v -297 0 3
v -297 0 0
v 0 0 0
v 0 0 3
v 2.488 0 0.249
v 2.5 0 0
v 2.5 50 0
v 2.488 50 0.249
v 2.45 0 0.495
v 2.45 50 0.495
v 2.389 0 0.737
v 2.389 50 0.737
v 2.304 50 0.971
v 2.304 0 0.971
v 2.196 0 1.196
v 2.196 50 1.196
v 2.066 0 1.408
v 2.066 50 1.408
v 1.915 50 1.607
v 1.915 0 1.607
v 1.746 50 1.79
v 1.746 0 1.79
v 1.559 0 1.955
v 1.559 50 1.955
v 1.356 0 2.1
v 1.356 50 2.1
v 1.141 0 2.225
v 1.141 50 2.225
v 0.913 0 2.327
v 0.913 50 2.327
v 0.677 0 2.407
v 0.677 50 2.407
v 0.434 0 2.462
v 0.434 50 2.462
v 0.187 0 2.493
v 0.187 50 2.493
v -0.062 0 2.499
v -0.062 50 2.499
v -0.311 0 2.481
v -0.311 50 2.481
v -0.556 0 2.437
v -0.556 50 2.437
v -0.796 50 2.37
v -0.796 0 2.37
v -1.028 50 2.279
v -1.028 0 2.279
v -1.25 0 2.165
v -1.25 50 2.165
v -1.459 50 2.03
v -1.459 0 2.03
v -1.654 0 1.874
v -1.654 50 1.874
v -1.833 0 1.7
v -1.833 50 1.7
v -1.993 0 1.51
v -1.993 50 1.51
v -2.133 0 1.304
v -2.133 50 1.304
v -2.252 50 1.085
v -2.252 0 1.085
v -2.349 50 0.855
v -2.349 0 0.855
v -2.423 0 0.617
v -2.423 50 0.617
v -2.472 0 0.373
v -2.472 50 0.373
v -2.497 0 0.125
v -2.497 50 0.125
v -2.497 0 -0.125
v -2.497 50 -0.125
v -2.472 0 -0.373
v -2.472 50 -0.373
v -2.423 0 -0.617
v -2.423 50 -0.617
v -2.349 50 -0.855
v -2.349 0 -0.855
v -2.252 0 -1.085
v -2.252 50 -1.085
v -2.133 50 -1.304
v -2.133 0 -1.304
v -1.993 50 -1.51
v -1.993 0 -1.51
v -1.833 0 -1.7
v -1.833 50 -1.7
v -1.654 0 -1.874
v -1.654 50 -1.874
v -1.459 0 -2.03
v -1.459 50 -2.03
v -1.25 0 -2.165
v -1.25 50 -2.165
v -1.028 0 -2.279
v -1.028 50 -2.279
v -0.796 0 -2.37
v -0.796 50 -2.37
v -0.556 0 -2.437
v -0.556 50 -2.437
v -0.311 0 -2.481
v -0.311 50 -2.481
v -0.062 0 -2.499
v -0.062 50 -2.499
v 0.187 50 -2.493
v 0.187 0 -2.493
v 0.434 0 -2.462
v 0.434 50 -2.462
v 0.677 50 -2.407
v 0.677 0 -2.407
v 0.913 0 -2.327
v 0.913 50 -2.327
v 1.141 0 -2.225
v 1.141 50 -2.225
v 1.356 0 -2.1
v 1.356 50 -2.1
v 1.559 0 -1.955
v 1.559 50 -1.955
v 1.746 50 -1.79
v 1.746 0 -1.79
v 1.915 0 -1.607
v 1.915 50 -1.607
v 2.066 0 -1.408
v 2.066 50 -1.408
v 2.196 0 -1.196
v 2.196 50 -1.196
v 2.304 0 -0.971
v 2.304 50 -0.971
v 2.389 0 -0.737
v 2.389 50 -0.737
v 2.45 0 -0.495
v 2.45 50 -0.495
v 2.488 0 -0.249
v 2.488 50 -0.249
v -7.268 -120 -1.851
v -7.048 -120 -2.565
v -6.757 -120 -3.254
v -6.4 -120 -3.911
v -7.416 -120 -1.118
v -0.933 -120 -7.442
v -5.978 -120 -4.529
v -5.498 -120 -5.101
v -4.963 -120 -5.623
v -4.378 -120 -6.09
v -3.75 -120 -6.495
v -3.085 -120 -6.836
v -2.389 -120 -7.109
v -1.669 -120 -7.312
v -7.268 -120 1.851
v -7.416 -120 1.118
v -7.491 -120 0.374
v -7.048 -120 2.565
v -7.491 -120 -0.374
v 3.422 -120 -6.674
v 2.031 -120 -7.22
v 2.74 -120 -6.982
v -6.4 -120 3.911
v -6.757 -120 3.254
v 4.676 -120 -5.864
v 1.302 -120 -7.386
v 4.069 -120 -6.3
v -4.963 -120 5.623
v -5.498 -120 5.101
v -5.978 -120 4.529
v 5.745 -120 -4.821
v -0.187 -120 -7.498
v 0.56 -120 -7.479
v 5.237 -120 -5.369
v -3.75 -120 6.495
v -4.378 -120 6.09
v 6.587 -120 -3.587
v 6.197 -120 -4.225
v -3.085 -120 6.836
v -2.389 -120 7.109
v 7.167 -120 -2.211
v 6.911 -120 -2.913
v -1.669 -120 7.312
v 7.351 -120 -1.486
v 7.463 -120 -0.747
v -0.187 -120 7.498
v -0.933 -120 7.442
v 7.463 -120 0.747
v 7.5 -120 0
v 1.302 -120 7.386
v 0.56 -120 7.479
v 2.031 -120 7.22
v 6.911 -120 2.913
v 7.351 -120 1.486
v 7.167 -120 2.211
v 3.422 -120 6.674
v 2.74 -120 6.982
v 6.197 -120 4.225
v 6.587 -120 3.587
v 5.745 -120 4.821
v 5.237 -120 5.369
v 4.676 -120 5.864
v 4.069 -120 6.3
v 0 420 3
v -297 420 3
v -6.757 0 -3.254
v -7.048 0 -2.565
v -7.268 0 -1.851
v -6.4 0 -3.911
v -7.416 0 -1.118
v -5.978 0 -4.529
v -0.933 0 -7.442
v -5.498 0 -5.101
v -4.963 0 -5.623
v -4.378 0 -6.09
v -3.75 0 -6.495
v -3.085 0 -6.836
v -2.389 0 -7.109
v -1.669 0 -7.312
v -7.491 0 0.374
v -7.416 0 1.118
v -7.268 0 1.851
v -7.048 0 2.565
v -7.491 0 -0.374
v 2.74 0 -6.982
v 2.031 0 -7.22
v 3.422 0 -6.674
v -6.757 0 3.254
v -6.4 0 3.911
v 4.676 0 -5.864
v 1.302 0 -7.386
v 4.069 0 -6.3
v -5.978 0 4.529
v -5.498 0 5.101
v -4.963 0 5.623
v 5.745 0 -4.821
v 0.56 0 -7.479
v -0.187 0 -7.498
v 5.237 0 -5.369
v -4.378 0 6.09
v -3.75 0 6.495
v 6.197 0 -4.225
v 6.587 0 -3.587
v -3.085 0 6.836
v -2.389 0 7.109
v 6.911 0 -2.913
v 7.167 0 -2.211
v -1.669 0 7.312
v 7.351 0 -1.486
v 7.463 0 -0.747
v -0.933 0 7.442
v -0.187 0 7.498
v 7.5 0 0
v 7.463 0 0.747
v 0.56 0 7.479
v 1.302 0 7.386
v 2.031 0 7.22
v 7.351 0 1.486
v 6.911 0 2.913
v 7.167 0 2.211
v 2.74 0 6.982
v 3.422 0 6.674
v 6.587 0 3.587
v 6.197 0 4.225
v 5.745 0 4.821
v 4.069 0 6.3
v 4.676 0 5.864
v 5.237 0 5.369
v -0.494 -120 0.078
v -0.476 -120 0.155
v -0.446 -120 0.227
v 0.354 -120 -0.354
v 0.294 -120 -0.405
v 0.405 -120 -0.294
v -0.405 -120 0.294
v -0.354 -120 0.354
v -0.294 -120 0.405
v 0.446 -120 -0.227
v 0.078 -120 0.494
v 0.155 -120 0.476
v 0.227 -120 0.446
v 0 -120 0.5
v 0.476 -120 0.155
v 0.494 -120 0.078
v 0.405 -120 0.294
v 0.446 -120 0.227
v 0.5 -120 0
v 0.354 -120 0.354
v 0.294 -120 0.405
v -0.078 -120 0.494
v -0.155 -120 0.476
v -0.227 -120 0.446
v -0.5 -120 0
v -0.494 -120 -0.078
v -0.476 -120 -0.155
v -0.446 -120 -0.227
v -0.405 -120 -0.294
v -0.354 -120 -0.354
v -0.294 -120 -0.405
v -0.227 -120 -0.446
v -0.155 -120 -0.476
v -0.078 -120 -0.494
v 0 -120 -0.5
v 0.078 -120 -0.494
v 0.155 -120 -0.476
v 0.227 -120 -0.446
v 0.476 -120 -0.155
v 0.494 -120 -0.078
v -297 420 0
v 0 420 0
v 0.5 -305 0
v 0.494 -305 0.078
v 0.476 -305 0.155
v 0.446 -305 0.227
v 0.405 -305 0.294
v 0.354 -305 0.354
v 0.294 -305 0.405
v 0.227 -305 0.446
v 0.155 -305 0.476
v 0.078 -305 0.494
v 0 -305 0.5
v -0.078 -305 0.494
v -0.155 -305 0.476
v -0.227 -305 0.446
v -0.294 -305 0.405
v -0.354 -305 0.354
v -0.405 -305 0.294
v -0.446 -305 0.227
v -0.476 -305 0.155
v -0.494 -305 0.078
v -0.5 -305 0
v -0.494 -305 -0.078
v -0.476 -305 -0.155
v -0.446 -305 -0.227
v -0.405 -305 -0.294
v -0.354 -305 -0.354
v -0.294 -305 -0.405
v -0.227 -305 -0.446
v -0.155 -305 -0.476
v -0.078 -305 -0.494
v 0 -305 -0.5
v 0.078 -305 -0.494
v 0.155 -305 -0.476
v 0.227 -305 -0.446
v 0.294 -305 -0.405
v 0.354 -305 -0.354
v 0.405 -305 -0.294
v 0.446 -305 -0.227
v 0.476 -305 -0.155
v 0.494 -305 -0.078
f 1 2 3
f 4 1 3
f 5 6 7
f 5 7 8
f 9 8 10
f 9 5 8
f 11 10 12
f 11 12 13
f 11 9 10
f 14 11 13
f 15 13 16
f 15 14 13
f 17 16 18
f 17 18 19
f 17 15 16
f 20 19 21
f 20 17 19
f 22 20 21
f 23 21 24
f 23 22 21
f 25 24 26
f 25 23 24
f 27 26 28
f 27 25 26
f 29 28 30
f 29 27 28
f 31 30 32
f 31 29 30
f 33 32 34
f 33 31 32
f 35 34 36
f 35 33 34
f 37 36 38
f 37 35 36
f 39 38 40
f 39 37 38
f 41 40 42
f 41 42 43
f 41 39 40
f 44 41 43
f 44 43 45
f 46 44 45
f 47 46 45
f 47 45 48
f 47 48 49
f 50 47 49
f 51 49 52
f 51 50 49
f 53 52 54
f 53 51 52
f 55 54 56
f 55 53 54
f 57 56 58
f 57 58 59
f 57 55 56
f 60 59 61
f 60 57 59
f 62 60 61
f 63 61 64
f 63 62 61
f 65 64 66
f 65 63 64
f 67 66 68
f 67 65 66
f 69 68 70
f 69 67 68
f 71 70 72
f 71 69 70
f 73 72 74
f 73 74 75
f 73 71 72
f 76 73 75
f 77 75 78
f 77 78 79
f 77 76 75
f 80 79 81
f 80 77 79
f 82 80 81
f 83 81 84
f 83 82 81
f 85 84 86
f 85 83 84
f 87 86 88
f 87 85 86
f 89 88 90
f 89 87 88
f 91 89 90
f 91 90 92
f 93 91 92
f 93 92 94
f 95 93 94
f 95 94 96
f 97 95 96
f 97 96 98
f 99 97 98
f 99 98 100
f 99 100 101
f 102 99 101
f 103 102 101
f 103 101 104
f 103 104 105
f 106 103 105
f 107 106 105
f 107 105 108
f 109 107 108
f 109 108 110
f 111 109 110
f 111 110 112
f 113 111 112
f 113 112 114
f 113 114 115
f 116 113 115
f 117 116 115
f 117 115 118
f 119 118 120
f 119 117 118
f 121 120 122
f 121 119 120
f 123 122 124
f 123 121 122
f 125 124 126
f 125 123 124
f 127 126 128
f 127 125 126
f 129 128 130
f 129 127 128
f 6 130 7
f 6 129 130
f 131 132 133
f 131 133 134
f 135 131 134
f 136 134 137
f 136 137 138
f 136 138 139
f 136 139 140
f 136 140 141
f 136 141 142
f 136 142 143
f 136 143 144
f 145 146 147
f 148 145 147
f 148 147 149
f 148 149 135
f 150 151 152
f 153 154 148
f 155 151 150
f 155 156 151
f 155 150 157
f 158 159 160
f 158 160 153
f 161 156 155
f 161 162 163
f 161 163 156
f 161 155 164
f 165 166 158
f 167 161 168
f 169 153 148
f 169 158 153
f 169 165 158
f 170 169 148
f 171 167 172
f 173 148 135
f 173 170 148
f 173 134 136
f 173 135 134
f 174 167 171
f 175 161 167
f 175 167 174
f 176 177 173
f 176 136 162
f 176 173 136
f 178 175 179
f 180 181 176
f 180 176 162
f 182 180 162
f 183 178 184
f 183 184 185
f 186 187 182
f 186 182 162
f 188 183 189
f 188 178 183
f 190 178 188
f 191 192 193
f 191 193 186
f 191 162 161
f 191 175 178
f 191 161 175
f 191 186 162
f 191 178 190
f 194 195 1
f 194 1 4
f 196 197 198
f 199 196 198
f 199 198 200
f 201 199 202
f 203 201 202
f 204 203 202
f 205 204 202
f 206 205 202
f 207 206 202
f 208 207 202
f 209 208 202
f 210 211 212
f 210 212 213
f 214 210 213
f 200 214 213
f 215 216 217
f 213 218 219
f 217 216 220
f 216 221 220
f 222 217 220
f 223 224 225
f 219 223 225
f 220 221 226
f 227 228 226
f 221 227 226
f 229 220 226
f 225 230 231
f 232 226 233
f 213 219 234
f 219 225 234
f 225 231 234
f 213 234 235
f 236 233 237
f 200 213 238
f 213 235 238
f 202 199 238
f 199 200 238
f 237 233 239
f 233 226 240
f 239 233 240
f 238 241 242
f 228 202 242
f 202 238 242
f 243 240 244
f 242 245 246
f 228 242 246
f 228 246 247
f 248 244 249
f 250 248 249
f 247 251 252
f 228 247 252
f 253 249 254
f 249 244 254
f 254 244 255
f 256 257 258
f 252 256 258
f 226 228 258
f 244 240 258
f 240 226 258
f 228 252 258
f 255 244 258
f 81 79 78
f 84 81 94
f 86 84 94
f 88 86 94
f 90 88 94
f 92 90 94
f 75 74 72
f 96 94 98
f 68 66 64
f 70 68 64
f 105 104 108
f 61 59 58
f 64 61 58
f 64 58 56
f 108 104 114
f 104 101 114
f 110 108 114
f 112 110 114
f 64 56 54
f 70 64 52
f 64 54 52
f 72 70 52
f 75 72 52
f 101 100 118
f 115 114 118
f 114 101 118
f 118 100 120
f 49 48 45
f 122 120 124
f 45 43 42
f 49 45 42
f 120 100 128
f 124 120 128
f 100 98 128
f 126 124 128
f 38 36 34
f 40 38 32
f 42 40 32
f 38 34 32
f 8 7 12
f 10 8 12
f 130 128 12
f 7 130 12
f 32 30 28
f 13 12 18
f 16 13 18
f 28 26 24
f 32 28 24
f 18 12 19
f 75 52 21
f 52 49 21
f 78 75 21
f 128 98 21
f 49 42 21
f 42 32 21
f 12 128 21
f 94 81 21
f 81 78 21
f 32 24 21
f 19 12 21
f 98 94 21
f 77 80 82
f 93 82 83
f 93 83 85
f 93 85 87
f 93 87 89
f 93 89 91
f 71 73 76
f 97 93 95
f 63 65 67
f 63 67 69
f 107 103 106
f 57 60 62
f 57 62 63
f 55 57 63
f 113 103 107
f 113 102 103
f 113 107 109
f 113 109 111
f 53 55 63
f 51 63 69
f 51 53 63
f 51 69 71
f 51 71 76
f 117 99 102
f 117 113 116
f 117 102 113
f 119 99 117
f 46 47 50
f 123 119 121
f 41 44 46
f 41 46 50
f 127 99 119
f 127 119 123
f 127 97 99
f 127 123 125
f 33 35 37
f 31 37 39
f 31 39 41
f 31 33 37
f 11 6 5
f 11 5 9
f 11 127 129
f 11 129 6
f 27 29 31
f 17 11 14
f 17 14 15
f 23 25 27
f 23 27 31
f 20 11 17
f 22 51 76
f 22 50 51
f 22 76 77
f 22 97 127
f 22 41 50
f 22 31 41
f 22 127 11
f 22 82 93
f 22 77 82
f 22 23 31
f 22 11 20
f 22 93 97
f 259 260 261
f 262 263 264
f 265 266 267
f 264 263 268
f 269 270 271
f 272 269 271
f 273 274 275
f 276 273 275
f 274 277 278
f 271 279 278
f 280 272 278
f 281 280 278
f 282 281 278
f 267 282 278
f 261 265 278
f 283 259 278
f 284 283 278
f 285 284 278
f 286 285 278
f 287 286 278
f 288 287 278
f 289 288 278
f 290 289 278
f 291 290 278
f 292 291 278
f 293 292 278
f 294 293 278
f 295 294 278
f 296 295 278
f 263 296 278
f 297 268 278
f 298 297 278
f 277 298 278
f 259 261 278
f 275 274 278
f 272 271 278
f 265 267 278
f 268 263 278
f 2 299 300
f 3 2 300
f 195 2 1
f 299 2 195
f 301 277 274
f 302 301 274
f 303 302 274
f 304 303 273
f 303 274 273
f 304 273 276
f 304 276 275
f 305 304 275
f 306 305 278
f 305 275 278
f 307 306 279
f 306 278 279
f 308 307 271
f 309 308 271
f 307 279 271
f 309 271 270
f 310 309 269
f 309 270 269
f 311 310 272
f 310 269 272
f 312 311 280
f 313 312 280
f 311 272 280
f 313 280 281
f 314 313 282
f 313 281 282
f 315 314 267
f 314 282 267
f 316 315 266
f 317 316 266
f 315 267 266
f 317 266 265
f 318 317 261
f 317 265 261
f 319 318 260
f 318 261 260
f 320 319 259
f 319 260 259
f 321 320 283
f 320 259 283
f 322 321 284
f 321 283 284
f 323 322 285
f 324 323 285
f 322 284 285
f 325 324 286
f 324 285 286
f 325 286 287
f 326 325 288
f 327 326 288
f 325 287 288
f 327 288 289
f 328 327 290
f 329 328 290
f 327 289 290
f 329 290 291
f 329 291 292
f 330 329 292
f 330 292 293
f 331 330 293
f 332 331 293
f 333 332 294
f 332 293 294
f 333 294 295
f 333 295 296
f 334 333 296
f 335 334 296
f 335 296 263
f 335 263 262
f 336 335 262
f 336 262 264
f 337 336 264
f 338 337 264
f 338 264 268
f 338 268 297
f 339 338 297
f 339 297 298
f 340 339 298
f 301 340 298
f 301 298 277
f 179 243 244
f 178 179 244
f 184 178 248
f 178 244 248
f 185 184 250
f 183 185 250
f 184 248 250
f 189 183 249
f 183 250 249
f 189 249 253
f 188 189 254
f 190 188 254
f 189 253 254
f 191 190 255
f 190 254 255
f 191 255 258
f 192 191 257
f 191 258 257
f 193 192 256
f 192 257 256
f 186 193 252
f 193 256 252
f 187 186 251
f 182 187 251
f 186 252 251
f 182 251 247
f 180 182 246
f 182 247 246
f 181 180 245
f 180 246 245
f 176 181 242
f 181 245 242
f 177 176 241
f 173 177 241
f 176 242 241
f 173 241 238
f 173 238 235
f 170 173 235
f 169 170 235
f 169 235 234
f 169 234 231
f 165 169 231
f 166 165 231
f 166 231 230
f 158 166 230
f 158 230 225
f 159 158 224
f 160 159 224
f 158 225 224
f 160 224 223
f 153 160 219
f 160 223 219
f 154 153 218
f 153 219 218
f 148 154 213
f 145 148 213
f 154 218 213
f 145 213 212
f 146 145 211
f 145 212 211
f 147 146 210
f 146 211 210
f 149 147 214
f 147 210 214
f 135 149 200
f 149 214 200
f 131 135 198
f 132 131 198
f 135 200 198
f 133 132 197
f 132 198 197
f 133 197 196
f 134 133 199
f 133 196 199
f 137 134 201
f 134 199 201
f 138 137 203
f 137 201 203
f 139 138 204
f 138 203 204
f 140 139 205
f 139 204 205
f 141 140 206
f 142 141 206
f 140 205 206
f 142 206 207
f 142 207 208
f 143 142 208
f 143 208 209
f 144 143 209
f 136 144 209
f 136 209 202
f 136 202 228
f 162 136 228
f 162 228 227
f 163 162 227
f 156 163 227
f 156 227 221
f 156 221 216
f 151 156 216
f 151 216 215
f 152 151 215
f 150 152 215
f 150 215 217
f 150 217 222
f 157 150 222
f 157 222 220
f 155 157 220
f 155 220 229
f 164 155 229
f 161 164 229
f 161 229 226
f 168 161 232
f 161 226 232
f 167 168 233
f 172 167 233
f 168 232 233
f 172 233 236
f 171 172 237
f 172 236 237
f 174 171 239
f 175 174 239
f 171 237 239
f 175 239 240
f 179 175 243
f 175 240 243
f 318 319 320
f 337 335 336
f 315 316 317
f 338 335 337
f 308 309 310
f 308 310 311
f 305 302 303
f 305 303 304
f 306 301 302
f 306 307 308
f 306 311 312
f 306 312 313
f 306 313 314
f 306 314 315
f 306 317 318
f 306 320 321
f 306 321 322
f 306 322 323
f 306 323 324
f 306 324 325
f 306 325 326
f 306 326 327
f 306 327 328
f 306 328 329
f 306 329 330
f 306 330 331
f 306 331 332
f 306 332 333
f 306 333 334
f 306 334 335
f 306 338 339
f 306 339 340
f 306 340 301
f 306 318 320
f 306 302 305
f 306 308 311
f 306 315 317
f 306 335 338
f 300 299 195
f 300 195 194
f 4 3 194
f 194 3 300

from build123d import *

# Parameters (mm, degrees)
F0_R     = 7.5
F1_DEPTH = 120
F3_R     = 0.5
F4_DEPTH = 185
F5_R     = 2.5
F6_DEPTH = 50
F7_W     = 297
F7_H     = 420
F8_DEPTH = 3


with BuildPart() as f1:
    # F0 (on Front) → F1 (new body)
    with BuildSketch(Plane.XZ):
        Circle(F0_R)
    extrude(amount=F1_DEPTH)


with BuildPart() as f4:
    # F3 (on face) → F4 (new body)
    with BuildSketch(Plane.XZ.offset(120)):
        Circle(F3_R)
    extrude(amount=F4_DEPTH)


with BuildPart() as f6:
    # F5 (on Front) → F6 (new body)
    with BuildSketch(Plane.XZ):
        Circle(F5_R)
    extrude(amount=-F6_DEPTH)


with BuildPart() as f8:
    # F7 (on Top) → F8 (new body)
    with BuildSketch(Plane.XY):
        with Locations((-148.5, 210)):
            Rectangle(F7_W, F7_H)
    extrude(amount=F8_DEPTH)


solid = Compound([f1.part, f4.part, f6.part, f8.part])
